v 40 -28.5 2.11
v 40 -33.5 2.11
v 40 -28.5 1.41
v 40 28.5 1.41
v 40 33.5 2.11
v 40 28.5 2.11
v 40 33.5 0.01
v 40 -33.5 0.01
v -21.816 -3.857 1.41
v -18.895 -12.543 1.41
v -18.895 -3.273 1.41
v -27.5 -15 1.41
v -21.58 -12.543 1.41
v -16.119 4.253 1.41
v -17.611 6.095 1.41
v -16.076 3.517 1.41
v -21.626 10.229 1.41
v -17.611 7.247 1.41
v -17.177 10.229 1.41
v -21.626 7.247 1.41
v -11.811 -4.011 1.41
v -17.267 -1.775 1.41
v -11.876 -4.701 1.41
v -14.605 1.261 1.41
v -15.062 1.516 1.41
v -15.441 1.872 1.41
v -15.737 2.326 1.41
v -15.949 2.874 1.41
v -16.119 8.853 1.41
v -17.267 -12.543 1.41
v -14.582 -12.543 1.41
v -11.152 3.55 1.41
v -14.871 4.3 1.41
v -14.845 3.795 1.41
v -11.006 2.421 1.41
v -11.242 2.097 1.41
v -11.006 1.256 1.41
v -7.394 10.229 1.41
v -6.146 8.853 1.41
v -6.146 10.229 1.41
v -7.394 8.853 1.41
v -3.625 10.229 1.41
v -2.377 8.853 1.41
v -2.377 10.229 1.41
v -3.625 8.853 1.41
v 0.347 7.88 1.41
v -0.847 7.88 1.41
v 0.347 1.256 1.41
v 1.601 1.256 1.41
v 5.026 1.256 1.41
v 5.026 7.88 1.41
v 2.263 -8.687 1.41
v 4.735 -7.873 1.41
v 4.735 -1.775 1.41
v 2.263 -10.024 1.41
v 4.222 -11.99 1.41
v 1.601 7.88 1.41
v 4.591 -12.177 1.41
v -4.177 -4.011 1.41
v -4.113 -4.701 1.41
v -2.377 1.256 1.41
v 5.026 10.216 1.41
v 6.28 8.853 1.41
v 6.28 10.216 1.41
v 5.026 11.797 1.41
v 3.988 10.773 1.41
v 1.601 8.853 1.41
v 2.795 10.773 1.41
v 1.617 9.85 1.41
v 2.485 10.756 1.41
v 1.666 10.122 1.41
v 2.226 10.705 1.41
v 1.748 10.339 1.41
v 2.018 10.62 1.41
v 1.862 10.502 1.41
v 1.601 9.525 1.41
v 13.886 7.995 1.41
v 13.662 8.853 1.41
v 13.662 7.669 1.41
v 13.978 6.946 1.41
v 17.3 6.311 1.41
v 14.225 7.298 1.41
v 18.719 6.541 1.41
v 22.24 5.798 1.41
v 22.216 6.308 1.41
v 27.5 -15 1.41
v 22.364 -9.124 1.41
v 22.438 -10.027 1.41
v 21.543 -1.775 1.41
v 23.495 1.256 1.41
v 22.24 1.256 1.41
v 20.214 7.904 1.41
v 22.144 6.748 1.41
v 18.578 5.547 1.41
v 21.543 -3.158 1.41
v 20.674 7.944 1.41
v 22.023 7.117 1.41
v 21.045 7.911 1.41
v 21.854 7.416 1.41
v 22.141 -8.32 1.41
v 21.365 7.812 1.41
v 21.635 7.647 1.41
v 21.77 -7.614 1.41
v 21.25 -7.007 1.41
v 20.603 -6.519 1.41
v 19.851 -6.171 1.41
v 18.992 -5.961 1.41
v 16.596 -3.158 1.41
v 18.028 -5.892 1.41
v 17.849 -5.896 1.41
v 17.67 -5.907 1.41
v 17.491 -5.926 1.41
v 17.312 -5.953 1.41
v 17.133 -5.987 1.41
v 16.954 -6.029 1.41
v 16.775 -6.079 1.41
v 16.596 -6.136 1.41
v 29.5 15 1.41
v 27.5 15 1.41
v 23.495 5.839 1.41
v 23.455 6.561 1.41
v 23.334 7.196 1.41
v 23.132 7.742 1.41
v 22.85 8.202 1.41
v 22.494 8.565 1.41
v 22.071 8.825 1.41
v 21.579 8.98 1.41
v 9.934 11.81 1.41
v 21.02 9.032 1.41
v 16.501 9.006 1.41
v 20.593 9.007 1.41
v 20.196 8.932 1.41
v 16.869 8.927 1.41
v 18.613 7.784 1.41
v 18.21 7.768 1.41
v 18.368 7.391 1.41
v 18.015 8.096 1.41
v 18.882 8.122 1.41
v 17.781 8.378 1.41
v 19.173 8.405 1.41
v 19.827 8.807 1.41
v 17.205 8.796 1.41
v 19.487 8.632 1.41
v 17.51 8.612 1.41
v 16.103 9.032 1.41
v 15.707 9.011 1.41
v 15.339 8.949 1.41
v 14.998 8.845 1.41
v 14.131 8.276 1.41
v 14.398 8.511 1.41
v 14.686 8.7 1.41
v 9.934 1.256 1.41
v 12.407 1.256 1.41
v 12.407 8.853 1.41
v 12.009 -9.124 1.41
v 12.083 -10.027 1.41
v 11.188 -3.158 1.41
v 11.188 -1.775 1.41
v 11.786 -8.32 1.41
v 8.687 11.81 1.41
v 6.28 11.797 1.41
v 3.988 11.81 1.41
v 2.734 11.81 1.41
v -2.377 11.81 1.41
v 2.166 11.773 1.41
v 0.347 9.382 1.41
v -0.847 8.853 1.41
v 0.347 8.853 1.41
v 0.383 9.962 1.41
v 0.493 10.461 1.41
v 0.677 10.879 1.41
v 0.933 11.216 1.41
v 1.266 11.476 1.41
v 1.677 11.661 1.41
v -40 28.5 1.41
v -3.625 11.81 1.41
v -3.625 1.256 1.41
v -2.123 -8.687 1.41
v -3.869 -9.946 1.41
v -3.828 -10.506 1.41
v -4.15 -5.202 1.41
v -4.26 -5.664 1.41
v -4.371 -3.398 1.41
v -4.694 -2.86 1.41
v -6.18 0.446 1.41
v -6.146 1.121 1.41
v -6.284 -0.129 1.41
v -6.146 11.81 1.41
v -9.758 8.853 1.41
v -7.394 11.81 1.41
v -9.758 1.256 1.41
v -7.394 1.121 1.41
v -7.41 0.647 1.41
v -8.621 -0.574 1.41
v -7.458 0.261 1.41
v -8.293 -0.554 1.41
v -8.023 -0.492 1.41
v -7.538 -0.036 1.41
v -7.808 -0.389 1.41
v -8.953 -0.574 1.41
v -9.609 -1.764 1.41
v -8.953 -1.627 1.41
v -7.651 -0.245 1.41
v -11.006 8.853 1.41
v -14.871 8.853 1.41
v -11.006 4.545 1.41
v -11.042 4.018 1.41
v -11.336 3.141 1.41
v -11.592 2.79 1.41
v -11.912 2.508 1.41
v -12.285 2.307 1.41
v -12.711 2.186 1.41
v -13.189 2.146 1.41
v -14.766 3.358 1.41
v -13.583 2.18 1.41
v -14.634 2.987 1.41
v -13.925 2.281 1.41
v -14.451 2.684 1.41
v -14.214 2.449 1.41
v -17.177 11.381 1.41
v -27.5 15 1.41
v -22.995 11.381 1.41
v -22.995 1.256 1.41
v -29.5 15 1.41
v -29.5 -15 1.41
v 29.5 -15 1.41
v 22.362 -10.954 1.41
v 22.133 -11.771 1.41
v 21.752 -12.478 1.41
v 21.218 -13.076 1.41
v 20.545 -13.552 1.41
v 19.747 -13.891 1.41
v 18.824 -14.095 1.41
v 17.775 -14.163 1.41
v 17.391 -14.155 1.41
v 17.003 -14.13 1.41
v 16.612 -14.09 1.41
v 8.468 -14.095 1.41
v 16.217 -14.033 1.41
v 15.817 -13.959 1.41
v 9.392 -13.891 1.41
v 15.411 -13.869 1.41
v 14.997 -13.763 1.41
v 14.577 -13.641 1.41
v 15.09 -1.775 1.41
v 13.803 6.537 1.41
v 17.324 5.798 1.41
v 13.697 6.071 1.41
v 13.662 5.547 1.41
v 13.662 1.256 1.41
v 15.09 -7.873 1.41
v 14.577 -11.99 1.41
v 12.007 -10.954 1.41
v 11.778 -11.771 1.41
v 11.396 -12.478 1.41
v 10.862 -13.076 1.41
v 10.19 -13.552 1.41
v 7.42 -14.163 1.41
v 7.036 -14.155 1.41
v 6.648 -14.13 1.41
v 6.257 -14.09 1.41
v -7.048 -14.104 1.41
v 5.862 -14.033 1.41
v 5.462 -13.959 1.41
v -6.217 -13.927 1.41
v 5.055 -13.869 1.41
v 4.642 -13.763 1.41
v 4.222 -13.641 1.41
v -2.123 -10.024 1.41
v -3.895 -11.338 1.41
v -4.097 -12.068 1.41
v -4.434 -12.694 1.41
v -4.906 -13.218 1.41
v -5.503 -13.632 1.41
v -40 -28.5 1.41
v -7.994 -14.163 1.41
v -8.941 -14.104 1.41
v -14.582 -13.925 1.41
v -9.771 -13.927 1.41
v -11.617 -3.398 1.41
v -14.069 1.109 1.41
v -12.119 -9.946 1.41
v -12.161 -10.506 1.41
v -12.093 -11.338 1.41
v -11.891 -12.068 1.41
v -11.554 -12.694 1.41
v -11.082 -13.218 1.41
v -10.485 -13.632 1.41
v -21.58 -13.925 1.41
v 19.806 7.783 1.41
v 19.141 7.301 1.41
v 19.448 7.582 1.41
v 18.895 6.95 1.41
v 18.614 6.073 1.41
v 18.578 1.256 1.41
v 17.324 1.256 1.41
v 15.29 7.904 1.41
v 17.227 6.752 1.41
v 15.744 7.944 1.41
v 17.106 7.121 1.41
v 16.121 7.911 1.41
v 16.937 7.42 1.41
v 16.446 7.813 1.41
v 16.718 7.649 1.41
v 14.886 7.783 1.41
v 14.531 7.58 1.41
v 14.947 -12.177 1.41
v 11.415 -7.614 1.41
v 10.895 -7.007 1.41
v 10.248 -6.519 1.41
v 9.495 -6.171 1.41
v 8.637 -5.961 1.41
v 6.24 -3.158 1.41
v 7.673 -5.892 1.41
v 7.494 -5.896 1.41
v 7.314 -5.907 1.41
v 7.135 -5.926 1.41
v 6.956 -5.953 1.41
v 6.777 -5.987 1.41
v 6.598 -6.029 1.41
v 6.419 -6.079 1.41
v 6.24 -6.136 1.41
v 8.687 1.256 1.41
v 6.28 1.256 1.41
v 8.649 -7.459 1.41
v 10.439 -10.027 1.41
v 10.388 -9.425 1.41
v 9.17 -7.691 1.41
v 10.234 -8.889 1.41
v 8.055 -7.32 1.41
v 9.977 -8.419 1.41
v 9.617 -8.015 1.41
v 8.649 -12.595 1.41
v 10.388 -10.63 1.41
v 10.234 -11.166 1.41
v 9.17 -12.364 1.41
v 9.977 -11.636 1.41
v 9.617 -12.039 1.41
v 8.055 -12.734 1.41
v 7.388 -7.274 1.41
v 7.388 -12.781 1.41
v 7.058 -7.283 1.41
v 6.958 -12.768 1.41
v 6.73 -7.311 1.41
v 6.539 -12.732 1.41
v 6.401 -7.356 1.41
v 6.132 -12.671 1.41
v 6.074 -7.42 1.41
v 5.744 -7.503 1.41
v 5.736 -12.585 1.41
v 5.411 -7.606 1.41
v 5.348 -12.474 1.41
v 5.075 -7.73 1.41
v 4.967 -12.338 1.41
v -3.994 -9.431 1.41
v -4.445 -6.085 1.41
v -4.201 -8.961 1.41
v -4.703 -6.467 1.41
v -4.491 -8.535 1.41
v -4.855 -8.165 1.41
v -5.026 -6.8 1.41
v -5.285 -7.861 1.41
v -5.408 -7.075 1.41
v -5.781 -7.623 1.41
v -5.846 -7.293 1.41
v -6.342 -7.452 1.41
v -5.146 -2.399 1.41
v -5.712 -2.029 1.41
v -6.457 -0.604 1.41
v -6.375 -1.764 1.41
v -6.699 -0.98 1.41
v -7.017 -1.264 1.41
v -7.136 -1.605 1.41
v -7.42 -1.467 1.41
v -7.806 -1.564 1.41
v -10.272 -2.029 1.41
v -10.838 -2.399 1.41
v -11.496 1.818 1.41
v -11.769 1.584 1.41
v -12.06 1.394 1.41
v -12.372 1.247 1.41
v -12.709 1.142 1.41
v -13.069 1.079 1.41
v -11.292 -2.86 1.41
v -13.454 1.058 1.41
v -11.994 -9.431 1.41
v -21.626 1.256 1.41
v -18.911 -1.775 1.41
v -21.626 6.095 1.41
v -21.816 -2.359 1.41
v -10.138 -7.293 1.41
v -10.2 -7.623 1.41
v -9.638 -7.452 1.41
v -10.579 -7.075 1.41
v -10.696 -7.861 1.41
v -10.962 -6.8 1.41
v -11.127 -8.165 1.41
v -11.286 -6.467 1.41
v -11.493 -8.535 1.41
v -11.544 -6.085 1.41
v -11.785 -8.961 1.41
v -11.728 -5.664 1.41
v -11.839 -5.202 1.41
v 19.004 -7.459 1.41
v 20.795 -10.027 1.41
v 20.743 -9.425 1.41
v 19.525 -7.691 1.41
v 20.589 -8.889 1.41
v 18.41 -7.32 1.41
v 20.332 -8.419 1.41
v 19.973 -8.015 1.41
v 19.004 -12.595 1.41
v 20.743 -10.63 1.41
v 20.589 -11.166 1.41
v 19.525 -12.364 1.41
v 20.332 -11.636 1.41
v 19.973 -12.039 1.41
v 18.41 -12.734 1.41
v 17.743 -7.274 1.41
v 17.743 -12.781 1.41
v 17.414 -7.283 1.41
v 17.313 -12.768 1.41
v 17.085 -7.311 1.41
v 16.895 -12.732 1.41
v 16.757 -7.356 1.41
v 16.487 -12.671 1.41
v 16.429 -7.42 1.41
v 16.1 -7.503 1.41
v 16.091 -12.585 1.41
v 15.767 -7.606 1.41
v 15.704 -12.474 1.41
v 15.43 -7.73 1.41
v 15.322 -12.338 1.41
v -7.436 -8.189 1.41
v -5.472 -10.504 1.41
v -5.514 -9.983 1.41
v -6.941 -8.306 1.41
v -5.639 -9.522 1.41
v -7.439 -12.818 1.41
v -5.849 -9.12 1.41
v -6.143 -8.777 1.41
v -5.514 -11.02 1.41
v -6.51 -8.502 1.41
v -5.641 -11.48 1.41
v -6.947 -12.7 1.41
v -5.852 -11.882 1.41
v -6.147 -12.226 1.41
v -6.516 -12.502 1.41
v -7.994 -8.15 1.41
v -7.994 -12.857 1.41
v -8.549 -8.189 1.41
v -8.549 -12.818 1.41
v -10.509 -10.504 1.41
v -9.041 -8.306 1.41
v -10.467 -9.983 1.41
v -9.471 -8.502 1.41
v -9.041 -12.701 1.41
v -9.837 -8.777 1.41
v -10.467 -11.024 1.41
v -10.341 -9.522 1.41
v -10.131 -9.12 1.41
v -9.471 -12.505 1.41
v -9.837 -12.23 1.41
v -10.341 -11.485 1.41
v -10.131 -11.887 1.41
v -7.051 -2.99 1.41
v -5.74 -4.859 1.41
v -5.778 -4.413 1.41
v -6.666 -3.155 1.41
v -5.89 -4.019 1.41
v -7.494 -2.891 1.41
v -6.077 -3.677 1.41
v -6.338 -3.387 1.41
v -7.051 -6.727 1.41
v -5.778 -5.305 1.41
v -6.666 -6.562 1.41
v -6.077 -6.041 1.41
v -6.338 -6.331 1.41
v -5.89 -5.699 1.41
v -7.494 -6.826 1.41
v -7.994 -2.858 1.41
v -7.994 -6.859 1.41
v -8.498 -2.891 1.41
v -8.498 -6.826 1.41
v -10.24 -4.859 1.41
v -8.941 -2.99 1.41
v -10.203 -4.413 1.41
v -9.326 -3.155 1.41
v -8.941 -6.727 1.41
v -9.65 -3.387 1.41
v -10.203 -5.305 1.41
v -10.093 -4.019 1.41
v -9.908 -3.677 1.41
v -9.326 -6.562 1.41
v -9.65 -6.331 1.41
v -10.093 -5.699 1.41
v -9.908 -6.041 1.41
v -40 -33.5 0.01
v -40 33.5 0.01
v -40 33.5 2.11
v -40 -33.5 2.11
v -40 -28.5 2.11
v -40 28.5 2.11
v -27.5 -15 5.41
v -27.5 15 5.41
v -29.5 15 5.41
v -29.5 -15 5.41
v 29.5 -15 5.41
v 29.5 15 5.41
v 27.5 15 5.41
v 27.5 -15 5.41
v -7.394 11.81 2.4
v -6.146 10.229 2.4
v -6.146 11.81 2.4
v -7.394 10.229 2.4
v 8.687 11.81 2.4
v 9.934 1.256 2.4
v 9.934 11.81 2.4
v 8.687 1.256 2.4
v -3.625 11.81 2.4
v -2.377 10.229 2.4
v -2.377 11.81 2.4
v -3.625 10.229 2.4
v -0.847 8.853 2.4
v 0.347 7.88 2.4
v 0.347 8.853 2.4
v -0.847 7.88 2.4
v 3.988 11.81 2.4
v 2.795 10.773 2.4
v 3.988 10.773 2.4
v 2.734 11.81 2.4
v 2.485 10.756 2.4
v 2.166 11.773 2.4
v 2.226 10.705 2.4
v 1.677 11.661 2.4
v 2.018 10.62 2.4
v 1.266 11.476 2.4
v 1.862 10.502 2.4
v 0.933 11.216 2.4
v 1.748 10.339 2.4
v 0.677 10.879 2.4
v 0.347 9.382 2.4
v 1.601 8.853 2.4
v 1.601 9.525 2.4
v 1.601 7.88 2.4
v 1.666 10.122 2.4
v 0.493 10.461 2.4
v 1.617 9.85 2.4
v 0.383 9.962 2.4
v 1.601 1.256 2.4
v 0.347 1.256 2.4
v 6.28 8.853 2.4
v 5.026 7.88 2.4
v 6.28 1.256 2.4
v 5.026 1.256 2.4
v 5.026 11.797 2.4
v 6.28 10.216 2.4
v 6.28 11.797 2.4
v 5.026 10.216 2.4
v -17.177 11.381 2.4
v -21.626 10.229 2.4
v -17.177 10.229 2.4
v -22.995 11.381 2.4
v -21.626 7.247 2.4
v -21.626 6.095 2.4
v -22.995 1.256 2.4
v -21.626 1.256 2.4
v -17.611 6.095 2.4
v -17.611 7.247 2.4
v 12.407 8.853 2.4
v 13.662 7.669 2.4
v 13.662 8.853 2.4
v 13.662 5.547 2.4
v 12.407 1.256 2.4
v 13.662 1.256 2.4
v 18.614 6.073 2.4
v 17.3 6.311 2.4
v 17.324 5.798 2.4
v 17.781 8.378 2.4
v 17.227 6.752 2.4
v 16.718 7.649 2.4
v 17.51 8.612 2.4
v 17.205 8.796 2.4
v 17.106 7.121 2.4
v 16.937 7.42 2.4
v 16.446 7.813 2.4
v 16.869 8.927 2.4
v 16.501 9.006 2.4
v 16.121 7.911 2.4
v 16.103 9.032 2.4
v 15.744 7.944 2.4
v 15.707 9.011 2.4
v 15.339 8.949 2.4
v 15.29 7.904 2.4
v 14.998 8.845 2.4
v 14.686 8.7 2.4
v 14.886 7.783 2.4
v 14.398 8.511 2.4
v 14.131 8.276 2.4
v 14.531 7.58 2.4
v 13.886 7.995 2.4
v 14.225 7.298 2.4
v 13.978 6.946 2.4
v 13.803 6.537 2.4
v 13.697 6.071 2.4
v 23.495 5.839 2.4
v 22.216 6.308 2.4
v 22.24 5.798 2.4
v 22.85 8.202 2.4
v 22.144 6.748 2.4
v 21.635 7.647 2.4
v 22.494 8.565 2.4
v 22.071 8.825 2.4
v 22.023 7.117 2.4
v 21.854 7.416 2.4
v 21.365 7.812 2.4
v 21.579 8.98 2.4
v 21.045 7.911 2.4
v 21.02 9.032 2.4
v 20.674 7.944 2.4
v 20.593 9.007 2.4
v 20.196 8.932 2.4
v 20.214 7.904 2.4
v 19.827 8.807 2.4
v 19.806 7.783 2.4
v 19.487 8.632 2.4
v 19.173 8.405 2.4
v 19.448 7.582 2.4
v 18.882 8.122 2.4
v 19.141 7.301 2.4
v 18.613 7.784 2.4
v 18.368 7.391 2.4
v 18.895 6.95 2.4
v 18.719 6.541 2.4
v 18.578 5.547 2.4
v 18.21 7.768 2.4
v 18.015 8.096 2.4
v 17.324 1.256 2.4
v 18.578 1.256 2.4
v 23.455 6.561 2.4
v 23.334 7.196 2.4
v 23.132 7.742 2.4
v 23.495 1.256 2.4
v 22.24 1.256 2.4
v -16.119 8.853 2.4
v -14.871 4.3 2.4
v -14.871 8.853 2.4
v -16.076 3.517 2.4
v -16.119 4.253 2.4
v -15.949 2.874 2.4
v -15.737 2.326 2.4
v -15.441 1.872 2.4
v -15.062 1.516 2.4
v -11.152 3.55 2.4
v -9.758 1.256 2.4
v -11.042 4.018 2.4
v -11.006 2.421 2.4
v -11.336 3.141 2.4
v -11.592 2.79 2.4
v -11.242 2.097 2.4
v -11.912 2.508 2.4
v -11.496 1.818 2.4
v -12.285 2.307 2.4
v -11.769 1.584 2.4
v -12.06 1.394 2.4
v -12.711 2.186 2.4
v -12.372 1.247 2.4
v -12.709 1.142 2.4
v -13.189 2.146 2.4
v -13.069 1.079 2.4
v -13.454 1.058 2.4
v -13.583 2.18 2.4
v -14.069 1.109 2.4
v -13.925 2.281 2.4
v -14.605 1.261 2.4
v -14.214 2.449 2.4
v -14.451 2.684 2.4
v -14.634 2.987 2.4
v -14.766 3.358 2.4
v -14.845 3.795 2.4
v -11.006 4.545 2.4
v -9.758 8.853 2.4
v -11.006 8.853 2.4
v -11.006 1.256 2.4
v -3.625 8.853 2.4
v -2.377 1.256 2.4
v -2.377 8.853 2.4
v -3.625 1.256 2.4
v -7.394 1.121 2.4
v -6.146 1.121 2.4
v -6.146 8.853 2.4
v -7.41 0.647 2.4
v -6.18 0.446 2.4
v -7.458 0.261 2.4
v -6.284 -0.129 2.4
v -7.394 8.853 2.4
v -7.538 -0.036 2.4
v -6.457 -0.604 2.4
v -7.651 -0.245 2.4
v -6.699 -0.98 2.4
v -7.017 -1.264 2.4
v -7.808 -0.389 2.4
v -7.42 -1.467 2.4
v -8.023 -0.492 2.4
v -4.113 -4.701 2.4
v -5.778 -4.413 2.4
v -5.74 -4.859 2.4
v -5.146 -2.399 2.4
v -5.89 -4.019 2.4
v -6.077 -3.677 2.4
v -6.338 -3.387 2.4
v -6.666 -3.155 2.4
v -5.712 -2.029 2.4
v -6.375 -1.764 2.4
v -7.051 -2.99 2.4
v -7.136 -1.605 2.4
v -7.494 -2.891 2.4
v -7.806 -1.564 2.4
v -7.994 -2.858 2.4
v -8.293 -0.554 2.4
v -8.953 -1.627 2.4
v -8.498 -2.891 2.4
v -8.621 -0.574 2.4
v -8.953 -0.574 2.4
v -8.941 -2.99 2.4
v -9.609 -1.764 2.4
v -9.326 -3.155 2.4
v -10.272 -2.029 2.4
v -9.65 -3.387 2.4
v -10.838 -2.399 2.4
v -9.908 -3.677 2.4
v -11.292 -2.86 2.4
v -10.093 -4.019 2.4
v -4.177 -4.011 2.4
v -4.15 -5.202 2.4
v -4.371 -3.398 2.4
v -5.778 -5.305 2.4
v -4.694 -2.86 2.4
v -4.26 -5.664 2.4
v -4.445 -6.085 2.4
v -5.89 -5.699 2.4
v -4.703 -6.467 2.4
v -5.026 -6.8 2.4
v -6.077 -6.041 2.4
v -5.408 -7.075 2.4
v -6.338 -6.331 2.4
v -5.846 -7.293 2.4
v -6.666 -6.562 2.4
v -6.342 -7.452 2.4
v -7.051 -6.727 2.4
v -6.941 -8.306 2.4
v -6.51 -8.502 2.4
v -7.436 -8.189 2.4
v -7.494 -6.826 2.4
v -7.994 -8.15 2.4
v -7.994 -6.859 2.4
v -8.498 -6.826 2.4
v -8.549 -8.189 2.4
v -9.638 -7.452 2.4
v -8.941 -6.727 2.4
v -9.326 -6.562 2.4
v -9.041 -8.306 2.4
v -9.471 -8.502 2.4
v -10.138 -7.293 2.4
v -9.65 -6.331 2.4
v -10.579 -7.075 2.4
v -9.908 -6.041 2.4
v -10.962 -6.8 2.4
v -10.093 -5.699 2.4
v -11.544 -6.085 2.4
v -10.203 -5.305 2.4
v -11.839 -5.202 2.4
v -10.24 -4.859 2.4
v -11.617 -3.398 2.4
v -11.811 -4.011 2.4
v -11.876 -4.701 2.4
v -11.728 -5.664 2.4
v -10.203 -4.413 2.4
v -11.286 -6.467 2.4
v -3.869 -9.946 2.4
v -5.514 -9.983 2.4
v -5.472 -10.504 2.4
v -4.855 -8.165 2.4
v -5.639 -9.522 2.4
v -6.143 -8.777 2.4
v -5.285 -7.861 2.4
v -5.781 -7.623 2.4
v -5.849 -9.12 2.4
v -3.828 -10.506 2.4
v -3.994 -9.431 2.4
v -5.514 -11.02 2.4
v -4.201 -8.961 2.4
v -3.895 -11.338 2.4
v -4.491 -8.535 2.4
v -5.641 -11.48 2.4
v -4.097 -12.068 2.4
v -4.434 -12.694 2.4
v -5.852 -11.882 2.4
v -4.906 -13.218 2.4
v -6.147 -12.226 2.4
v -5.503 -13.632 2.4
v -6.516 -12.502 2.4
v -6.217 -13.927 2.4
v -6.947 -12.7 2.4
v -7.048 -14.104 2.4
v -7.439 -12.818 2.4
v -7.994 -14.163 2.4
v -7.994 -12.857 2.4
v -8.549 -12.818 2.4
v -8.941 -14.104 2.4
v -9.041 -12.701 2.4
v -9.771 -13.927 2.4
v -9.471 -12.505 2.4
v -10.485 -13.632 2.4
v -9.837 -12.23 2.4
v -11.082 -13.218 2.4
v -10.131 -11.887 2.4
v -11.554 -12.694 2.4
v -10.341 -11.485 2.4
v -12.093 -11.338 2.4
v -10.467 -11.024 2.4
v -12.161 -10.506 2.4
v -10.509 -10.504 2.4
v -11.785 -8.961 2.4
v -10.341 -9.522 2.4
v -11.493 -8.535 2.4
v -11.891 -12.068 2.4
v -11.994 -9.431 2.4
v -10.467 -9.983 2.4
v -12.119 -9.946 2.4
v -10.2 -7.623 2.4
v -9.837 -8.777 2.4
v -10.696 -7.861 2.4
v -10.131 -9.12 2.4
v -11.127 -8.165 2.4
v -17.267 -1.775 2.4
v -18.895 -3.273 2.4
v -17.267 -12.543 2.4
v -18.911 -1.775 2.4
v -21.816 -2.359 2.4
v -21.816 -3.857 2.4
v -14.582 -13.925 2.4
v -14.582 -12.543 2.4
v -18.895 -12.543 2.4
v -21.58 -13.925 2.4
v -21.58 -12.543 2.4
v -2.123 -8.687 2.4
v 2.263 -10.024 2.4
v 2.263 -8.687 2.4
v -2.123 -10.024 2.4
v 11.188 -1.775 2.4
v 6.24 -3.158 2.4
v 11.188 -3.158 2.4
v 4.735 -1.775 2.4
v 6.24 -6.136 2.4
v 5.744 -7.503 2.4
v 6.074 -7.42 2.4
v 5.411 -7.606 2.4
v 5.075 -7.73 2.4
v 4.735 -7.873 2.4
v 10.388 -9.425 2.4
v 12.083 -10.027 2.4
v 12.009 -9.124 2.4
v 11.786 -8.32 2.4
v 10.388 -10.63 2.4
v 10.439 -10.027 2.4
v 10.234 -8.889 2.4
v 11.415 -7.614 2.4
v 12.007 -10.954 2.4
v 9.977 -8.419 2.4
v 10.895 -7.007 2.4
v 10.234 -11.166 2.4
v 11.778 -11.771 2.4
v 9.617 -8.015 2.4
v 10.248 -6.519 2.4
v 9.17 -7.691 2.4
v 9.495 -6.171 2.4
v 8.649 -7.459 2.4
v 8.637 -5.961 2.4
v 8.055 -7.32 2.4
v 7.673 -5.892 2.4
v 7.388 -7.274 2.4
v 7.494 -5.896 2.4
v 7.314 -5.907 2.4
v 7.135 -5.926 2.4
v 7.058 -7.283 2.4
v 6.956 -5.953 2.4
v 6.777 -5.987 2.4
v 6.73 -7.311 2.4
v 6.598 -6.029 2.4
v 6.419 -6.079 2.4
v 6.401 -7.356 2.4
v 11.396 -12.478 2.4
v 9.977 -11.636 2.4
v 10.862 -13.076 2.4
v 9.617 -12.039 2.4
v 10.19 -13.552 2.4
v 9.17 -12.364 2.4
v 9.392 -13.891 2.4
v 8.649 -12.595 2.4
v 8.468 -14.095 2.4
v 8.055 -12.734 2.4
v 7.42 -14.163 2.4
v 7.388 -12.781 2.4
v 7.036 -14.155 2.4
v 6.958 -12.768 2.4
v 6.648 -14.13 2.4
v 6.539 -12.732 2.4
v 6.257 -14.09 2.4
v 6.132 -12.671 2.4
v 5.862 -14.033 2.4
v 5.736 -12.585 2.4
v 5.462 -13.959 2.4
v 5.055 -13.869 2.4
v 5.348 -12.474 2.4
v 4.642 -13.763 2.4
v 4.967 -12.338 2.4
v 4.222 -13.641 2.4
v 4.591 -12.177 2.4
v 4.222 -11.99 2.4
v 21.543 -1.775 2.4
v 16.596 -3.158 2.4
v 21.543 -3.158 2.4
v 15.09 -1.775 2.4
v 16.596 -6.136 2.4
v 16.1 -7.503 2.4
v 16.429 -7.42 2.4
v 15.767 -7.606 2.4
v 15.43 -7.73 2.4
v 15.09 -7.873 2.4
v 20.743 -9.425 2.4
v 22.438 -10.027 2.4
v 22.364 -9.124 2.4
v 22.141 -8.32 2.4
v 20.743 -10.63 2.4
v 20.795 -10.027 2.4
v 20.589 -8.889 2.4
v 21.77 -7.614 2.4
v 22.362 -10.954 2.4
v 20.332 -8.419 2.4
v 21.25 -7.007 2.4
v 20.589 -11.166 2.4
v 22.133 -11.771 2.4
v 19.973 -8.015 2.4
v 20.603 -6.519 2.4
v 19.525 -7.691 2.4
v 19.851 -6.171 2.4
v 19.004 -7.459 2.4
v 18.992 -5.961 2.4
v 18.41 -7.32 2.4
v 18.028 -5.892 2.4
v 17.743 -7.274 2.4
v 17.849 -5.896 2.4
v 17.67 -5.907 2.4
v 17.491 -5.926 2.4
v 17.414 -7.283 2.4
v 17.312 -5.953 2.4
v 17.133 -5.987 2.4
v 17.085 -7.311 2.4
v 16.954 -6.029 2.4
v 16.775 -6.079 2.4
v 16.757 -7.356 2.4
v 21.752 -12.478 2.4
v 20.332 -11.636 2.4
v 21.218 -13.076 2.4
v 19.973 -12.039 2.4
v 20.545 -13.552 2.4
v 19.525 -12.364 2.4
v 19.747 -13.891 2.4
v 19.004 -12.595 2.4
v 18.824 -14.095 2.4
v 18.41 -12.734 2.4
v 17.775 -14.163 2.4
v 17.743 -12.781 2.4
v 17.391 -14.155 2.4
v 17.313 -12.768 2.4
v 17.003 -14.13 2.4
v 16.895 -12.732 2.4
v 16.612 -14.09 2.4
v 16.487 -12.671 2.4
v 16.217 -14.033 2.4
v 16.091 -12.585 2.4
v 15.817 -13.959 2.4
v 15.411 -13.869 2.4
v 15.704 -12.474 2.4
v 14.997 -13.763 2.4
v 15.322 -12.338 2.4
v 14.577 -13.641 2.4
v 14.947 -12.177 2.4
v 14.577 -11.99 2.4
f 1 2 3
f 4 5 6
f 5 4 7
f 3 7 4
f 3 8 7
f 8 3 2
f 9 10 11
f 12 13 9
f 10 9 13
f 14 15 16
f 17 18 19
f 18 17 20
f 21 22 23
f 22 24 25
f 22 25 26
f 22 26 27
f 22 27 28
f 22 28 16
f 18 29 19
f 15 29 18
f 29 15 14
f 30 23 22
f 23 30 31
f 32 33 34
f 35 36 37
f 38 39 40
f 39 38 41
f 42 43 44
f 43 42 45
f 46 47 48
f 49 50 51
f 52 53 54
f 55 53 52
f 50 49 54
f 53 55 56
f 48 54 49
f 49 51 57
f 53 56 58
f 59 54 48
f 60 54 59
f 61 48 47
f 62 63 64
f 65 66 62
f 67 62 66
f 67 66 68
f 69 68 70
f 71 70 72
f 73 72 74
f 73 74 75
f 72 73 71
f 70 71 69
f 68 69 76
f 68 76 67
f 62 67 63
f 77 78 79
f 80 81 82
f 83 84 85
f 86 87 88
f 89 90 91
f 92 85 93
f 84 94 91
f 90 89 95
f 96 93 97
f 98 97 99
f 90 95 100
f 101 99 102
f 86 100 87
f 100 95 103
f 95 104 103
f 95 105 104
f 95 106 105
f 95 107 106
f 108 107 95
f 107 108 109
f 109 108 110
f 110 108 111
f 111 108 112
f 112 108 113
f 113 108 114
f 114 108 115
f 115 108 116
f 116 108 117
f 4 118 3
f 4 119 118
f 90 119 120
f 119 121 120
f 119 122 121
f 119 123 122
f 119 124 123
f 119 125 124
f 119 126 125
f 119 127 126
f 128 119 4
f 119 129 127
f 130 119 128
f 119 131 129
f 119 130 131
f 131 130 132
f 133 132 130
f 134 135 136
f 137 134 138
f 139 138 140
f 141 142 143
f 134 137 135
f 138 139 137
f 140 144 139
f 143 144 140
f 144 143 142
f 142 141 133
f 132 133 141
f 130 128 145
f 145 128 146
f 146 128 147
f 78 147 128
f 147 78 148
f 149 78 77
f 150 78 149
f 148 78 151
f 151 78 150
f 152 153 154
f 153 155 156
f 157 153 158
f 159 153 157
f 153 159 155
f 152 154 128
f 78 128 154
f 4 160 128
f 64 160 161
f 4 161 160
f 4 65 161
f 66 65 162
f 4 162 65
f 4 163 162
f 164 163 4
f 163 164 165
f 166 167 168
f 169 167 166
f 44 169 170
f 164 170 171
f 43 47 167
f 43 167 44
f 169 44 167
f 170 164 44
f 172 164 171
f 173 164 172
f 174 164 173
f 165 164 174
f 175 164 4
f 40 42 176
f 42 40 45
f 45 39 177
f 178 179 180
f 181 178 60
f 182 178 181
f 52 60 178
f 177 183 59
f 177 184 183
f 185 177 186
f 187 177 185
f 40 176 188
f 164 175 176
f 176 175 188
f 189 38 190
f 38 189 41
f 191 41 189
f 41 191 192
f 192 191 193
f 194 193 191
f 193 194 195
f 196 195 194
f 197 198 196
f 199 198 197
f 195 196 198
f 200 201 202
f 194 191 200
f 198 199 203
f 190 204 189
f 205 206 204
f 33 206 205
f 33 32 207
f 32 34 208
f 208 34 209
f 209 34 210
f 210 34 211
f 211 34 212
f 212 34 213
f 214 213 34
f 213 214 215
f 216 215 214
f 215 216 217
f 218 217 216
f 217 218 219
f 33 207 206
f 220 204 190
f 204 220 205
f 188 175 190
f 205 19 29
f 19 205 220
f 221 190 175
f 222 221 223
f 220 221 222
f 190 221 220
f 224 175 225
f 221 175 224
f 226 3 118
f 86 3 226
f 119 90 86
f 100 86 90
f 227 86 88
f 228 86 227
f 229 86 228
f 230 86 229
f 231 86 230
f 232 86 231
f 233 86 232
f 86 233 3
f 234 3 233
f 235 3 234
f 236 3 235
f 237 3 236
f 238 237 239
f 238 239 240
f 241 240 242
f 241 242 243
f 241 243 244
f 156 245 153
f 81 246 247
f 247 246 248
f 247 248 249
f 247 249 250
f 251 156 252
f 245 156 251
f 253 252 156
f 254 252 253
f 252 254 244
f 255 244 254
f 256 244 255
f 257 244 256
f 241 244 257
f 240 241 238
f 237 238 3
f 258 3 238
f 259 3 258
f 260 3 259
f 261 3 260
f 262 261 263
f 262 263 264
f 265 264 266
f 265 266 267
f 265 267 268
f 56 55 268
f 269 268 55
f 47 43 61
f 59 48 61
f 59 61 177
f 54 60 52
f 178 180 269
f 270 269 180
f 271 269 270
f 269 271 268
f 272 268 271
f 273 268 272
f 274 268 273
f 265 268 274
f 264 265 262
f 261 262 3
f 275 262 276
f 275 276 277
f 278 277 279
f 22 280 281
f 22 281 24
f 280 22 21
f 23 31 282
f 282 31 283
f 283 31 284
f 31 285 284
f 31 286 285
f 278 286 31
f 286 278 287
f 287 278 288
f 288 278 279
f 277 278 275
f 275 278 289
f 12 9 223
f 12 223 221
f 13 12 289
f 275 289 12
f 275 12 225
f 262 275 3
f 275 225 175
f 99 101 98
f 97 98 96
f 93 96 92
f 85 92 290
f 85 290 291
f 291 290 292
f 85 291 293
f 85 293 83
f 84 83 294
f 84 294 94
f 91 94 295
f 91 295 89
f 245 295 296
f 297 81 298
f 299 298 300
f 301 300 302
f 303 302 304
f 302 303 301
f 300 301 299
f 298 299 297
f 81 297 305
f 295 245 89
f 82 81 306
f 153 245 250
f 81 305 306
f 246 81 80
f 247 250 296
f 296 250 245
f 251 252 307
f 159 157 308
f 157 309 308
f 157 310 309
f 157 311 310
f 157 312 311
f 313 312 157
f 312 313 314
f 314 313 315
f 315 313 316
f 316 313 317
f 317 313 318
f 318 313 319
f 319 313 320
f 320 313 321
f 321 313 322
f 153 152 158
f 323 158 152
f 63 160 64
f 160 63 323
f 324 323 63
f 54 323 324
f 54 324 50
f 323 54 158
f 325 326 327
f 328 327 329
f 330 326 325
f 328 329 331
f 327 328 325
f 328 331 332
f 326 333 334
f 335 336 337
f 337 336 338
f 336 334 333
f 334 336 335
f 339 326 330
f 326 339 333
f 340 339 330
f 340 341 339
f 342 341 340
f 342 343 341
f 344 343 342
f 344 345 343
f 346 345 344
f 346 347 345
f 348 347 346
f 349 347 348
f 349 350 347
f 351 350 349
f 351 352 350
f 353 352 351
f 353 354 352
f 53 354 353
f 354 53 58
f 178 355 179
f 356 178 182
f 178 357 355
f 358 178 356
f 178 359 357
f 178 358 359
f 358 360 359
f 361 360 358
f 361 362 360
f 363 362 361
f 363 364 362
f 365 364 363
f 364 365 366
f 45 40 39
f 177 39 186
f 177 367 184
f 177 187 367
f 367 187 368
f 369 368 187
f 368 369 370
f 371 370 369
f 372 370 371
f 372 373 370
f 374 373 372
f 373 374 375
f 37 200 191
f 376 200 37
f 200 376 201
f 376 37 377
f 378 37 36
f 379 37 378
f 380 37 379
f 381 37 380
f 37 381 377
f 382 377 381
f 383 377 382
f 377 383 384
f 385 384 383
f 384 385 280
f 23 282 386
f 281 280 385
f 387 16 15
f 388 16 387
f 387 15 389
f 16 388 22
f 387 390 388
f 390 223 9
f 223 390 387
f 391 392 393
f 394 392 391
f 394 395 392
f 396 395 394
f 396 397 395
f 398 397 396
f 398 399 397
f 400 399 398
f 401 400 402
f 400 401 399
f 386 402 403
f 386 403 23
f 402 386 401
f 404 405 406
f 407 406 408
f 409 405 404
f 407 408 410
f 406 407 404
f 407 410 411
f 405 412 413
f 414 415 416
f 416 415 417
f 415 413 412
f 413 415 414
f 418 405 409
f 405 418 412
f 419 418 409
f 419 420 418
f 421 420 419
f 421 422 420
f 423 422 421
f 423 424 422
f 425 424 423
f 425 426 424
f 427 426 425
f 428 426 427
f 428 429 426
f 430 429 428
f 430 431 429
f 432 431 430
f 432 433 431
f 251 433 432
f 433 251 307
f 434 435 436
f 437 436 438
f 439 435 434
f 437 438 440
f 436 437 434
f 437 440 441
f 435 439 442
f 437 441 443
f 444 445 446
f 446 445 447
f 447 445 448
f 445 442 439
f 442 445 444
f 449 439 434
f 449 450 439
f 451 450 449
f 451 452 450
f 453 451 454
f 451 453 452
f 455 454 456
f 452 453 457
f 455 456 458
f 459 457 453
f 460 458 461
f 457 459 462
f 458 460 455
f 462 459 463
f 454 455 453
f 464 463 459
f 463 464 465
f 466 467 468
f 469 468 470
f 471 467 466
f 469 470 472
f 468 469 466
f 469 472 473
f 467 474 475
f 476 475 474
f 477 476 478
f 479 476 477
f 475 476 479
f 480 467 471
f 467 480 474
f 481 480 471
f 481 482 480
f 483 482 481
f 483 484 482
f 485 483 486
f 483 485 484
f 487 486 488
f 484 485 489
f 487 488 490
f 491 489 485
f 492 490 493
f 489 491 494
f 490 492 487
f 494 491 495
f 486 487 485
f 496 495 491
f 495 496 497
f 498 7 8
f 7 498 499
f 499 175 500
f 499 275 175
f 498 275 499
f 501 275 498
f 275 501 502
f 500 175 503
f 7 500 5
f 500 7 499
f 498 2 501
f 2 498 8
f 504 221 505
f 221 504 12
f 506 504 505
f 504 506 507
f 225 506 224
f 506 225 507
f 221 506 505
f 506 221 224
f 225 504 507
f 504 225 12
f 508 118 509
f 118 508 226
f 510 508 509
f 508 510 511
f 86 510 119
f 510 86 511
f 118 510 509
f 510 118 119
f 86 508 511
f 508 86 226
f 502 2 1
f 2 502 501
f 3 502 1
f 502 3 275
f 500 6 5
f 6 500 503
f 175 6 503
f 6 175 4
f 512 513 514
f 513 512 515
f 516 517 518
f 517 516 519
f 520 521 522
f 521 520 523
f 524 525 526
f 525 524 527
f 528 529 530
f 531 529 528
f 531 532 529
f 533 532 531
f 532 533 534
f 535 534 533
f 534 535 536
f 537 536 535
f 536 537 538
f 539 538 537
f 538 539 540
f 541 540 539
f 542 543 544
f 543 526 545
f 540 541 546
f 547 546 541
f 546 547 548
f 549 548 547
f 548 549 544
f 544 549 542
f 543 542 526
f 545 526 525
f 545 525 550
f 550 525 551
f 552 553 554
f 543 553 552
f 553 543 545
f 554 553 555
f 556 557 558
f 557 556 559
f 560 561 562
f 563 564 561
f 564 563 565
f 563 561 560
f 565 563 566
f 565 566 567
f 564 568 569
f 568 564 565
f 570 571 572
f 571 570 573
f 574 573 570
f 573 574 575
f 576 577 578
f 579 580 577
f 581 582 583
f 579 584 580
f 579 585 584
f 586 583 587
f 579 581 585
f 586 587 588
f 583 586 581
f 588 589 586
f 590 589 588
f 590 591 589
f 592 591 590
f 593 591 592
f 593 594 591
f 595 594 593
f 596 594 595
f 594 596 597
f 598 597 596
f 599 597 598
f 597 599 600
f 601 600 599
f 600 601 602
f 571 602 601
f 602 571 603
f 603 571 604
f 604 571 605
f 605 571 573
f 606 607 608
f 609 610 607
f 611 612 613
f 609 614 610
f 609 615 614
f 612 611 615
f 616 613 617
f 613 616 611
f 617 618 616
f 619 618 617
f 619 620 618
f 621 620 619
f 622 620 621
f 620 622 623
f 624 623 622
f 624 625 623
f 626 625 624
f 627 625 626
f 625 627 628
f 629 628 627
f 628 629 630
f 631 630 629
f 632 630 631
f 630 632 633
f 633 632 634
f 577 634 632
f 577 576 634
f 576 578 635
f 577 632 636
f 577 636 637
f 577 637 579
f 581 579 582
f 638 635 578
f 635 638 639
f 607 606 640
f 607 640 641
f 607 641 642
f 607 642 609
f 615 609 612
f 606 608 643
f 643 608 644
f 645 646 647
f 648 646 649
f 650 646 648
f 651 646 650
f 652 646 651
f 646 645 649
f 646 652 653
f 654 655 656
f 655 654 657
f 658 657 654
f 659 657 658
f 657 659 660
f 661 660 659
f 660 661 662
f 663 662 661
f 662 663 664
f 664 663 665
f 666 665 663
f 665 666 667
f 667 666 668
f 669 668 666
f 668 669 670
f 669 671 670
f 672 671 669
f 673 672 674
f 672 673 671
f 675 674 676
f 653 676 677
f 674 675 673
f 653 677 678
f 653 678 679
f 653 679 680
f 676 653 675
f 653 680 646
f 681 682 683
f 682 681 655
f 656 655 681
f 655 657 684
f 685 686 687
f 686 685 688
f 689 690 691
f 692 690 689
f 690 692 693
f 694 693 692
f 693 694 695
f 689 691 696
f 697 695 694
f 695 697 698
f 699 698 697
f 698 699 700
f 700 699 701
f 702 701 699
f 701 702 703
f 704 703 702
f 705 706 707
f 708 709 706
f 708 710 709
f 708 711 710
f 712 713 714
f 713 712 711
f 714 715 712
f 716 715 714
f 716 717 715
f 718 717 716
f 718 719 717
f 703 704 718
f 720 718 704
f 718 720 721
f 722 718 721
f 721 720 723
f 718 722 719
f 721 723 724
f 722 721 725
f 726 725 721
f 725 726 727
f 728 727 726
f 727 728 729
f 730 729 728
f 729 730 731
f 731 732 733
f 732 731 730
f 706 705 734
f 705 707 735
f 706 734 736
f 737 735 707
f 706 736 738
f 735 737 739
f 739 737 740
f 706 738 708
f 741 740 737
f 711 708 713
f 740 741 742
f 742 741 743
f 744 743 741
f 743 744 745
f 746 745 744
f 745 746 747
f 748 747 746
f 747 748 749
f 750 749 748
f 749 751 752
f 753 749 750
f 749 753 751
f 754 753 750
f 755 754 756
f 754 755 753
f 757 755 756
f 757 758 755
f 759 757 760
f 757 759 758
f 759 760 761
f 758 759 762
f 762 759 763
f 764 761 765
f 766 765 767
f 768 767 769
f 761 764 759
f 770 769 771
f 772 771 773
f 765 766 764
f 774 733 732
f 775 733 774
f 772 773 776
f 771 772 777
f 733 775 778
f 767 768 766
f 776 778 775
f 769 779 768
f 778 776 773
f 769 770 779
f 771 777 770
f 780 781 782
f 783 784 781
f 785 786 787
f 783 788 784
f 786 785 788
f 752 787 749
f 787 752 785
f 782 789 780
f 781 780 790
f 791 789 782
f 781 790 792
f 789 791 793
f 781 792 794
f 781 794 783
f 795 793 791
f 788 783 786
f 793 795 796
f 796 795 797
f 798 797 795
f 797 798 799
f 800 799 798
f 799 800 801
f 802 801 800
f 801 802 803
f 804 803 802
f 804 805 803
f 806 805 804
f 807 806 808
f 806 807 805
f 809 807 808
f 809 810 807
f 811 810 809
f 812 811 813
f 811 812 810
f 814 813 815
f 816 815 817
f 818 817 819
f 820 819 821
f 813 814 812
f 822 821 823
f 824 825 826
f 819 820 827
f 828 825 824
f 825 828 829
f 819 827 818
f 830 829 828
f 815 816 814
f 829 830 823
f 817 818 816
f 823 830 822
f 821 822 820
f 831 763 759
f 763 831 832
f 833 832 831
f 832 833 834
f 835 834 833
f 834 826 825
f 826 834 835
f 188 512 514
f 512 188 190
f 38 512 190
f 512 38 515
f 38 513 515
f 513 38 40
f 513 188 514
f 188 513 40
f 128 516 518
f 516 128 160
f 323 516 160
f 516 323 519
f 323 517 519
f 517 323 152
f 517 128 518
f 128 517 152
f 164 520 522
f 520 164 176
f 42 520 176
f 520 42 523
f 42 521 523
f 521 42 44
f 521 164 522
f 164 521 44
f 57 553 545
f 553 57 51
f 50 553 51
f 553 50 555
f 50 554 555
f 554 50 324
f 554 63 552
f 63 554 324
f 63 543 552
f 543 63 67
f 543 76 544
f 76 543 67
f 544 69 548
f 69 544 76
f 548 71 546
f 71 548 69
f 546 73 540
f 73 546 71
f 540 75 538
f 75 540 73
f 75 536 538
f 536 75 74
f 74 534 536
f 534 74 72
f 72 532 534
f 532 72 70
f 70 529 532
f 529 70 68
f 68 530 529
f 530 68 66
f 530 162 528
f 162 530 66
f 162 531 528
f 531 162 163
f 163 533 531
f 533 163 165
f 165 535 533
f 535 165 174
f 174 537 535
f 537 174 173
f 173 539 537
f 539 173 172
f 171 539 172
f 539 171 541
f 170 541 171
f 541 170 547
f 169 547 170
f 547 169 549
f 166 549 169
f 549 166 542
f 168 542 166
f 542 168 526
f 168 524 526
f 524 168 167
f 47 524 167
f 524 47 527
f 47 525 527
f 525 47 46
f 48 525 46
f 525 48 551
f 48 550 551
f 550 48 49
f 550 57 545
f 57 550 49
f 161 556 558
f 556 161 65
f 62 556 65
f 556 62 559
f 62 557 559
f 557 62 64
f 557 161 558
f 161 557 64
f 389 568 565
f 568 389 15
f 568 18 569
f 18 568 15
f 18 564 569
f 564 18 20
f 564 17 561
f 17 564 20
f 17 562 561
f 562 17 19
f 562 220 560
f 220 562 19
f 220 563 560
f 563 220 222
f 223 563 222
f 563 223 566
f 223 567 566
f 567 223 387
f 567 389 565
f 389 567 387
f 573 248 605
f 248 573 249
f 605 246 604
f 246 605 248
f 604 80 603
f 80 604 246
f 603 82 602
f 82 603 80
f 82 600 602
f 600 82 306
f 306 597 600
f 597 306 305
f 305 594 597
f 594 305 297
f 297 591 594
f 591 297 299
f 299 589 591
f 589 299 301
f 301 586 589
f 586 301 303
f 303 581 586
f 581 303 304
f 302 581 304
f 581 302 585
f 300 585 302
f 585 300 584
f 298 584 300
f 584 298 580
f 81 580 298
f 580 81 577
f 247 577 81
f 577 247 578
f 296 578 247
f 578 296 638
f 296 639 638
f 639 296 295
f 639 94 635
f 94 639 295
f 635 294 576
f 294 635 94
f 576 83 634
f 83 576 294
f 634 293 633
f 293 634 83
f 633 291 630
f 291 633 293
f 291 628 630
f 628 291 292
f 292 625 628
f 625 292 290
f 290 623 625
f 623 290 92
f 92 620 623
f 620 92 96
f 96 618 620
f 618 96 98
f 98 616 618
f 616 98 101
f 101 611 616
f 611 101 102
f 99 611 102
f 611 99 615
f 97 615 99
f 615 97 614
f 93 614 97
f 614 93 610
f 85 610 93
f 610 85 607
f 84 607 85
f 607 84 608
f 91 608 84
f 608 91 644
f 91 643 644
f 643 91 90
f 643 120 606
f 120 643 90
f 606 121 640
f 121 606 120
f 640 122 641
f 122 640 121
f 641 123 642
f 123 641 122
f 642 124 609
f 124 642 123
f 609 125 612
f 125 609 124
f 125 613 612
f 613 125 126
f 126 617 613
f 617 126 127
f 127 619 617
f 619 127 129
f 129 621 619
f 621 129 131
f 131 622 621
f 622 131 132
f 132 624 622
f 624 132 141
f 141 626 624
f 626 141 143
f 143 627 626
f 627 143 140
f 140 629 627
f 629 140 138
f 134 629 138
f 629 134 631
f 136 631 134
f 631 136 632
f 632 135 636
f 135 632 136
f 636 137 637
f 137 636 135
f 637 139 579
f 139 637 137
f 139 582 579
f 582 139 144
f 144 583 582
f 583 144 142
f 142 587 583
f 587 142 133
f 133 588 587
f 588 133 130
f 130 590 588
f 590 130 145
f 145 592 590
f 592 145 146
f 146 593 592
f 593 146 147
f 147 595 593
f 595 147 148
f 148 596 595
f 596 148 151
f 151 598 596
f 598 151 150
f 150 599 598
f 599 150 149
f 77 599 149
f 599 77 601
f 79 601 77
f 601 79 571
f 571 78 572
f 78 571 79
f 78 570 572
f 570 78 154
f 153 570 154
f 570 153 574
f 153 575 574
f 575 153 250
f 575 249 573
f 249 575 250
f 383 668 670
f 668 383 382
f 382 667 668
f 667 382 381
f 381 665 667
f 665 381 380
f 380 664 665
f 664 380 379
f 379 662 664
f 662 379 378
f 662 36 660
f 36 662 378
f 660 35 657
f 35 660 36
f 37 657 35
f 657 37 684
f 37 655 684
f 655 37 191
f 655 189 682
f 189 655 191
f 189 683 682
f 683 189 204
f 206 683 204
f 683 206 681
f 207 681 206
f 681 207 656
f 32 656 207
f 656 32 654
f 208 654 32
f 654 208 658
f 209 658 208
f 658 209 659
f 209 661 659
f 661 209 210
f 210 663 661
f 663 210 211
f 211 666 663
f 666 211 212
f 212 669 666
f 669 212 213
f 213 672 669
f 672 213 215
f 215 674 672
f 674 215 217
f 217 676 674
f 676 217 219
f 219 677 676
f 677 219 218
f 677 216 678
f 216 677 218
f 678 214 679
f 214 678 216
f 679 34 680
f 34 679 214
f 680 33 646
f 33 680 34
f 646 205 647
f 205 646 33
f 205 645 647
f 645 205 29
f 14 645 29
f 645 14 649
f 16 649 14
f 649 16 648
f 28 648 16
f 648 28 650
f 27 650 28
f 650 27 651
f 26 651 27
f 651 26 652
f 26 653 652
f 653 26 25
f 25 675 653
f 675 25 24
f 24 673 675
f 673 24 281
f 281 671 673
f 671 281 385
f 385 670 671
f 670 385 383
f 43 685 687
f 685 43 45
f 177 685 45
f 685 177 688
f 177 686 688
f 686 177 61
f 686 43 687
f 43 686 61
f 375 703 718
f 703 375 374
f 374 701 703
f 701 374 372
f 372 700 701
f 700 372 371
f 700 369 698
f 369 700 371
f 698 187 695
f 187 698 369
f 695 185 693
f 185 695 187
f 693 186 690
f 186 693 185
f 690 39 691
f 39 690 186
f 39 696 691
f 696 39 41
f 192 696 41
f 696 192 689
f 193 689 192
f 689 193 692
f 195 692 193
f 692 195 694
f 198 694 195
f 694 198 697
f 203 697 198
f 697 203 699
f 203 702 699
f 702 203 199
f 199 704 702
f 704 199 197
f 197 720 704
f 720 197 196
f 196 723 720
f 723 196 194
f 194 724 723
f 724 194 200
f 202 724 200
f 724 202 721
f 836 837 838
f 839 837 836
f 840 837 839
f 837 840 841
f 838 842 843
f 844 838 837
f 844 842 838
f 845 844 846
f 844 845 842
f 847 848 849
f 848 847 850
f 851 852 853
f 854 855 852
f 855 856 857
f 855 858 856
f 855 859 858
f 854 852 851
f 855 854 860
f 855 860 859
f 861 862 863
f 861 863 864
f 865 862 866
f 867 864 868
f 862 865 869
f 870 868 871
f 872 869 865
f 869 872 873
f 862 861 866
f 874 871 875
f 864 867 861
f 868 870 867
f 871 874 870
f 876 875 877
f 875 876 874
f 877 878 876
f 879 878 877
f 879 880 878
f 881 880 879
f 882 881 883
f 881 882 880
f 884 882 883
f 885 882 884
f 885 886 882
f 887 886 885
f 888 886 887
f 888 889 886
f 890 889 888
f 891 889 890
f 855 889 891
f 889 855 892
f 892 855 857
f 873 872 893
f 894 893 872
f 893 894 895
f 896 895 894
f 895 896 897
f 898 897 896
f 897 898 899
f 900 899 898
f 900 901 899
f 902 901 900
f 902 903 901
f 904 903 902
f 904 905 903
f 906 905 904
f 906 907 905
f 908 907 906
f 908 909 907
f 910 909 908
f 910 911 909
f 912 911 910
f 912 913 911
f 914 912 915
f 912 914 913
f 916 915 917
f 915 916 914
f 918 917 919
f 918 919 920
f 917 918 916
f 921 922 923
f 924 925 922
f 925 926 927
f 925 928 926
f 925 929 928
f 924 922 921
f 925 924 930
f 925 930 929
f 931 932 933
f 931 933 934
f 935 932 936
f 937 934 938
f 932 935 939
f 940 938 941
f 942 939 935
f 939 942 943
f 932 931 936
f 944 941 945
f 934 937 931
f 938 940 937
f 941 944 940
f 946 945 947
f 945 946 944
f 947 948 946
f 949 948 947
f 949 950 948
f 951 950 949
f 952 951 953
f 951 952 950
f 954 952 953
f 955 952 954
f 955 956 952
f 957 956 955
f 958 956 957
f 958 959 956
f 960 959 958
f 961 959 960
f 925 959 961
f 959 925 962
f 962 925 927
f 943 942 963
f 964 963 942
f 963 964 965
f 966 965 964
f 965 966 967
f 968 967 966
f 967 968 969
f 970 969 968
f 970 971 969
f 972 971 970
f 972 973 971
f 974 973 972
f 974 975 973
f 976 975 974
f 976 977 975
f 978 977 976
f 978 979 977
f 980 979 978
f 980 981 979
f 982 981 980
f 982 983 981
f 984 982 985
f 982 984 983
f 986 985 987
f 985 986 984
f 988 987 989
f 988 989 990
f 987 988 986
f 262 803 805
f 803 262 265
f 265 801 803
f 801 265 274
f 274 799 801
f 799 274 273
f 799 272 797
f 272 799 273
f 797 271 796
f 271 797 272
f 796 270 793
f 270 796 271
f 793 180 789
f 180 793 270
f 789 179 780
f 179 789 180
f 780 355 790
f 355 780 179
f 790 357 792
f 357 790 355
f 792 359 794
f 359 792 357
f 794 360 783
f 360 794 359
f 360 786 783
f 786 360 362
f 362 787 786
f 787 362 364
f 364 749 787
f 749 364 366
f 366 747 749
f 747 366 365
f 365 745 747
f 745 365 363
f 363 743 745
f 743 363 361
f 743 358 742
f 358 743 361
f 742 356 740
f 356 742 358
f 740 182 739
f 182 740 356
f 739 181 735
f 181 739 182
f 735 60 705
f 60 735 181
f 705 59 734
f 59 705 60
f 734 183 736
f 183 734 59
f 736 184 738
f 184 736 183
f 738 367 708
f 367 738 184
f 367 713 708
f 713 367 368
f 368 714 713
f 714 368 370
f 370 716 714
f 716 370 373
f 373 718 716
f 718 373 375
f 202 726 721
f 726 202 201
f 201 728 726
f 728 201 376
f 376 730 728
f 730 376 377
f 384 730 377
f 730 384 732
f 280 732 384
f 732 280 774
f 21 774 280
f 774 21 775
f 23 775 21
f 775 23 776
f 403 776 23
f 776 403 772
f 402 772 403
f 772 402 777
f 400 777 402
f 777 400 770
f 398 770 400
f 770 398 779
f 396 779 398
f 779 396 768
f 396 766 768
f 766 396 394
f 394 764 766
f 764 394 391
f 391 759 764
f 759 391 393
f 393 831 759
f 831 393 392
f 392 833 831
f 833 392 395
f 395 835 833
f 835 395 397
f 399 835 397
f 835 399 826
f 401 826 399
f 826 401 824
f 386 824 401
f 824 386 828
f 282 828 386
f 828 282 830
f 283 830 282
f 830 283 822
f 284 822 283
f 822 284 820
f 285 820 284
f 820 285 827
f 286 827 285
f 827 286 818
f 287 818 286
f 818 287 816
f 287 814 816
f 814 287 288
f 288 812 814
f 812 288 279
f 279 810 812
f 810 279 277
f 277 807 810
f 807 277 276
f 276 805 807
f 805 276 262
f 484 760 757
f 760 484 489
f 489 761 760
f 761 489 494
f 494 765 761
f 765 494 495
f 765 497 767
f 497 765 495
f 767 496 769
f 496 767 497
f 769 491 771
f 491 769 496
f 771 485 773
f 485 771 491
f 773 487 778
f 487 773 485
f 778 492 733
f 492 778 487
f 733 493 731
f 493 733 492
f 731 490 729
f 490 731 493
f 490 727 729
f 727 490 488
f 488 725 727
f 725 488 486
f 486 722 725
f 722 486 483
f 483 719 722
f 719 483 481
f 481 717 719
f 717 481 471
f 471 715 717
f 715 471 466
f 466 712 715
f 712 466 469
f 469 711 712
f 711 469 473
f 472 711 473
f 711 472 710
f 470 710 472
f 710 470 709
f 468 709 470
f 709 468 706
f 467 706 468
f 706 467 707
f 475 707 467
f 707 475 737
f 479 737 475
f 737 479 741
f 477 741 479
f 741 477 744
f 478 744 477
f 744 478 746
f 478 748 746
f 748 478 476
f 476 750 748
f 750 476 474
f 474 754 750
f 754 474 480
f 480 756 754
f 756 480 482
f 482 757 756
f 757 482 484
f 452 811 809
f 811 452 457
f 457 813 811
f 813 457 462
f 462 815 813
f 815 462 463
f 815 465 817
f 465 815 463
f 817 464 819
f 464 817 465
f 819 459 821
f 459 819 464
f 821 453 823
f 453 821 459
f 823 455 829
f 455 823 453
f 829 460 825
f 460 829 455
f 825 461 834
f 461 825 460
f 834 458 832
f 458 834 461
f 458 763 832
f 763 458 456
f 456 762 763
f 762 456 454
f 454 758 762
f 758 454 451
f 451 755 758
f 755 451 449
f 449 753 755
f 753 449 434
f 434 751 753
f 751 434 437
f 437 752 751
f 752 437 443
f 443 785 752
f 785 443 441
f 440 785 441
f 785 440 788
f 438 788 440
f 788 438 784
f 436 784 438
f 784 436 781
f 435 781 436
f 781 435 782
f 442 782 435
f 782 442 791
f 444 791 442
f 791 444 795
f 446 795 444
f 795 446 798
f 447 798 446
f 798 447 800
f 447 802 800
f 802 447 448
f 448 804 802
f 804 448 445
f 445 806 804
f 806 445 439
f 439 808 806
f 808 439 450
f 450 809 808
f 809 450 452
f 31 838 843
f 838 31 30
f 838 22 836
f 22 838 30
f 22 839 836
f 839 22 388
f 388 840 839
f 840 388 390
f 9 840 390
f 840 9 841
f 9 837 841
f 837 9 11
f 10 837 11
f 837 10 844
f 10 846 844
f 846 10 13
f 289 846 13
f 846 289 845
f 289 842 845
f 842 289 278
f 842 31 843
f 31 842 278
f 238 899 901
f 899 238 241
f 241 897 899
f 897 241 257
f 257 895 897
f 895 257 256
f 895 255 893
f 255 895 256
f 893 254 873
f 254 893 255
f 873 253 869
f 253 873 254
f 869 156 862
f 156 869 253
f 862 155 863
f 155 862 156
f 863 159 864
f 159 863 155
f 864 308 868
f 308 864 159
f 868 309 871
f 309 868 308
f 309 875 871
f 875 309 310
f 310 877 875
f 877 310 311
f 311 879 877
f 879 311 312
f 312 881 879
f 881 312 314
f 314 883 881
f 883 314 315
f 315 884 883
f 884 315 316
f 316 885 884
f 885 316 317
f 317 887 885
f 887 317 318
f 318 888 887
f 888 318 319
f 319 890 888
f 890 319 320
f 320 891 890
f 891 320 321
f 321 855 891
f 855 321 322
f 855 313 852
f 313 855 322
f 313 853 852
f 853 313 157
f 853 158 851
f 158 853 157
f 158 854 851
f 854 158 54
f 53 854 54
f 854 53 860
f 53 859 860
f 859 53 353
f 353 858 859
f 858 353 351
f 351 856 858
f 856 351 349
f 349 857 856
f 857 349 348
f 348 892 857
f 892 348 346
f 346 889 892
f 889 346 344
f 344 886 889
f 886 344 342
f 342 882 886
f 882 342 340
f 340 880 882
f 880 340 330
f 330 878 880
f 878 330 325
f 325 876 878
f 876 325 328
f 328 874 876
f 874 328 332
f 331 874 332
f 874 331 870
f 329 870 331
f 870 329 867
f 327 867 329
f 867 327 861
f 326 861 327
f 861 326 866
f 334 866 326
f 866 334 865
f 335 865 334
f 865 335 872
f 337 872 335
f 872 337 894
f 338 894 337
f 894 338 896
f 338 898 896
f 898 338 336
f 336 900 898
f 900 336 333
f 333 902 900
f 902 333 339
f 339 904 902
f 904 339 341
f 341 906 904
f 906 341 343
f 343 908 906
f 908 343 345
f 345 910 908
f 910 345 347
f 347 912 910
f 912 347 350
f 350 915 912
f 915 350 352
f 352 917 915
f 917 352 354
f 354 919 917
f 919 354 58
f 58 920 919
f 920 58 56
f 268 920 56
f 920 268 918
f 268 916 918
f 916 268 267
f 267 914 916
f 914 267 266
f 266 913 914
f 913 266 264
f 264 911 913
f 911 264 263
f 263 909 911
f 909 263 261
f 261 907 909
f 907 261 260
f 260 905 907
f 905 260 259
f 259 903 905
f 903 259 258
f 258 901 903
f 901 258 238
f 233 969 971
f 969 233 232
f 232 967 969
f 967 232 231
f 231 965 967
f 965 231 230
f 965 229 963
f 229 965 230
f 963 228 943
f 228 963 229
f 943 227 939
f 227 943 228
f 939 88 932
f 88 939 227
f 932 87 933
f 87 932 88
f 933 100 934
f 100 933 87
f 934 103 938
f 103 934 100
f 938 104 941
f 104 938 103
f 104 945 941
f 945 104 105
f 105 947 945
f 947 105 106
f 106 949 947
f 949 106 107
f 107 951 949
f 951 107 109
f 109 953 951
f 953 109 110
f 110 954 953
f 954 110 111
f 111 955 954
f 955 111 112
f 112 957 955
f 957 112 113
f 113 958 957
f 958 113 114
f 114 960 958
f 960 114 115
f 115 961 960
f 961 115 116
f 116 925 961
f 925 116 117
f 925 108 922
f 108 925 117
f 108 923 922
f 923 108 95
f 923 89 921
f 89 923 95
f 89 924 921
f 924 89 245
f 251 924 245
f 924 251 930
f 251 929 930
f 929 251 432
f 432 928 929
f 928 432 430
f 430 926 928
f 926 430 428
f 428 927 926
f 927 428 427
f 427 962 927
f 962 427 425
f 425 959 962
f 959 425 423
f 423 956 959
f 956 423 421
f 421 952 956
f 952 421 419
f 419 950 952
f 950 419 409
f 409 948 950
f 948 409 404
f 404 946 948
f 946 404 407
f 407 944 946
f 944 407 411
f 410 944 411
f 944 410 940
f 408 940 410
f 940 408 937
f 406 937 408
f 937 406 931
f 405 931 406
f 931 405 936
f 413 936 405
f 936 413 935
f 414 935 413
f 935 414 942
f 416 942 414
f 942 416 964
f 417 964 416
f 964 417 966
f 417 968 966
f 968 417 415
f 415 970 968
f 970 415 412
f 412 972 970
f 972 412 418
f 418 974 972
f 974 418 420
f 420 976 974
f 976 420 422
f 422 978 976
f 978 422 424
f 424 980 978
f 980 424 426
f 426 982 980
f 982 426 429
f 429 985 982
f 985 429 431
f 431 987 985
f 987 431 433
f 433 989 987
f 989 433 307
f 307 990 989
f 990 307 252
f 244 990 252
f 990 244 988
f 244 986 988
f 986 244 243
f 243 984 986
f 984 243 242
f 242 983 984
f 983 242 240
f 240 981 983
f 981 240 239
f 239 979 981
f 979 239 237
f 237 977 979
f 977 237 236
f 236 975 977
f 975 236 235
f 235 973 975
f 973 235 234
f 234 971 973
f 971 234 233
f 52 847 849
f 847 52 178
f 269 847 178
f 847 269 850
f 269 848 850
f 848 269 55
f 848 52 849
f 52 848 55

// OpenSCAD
//
// 67 mm filter dust cap for filter holder
// Copyright (C) 2021 Uwe Glässner
//
// size of filter plate
plate_w = 80;
plate_d = 67;
plate_h = 1.4;

D = 0.01; // generic overlap of parts.





translate([-plate_w/2,-plate_d/2, D]) cube([plate_w,plate_d, plate_h]); // plate
translate([-plate_d/2+4, -15, D+plate_h]) cube([2, 30, 4]); // griff 1
translate([+plate_d/2-6,-15, D+plate_h]) cube([2, 30, 4]); // griff 2
translate([-plate_w/2,-plate_d/2, D+plate_h]) cube([plate_w, 5, 0.7]); // schiene 1
translate([-plate_w/2,+plate_d/2-5, D+plate_h]) cube([plate_w, 5, 0.7]); // schiene 2

translate([0, 5, plate_h]) {linear_extrude(height=1) {
    text("Fujifilm", size=10, font="Arial Black", halign="center", valign="center");}} 
translate([0, -8, plate_h]) {linear_extrude(height=1) {
    text("18-55", size=12, font="Arial Black", halign="center", valign="center");}}  
